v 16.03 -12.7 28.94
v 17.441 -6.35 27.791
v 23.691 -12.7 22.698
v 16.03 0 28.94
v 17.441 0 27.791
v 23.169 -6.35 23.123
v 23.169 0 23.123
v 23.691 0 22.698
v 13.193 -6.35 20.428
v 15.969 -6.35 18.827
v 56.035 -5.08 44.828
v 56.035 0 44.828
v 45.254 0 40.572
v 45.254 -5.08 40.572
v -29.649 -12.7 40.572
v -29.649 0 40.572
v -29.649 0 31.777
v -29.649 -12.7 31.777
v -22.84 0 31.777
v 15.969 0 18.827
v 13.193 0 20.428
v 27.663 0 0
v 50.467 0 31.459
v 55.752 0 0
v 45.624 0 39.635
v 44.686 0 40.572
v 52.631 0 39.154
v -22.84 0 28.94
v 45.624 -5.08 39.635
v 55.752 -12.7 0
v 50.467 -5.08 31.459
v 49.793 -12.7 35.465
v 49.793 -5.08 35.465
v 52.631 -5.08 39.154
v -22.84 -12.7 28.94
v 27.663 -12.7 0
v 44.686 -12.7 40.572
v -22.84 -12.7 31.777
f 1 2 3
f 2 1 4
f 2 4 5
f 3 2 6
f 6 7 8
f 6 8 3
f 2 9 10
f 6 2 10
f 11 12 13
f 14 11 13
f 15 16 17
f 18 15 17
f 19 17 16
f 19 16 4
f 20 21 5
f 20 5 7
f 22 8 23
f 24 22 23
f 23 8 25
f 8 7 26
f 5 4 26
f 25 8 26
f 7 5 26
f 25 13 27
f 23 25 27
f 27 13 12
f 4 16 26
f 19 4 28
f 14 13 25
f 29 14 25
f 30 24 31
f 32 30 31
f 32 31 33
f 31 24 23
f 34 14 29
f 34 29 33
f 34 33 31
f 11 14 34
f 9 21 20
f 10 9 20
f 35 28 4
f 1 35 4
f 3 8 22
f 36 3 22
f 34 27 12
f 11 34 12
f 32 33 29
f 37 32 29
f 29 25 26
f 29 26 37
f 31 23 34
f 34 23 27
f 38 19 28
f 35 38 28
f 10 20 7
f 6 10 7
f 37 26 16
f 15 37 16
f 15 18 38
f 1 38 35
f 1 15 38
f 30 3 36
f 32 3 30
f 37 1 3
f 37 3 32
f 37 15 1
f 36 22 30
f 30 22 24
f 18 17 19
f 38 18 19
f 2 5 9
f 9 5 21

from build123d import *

# Parameters (mm, degrees)
F1_DEPTH = 12.7
F3_DEPTH = 5.08
F5_DEPTH = 6.35


with BuildPart() as f1:
    # F0 (on Front) → F1 (new body)
    with BuildSketch(Plane.XZ):
        Polygon((23.690905, 22.697873), (27.663032, 0), (55.751652, 0), (49.793456, 35.465427), (44.68644, 40.572446), (-29.649096, 40.572446), (-29.649096, 31.777021), (-22.839734, 31.777021), (-22.839734, 28.939787), (16.030373, 28.939787), align=None)
    extrude(amount=F1_DEPTH)

    # F2 (on Front) → F3 (join)
    with BuildSketch(Plane.XZ):
        Polygon((56.03537, 44.828296), (45.253884, 40.572446), (47.605801, 34.614256), (50.077181, 30.074682), (52.630689, 39.153829), align=None)
    extrude(amount=F3_DEPTH)

    # F4 (on Front) → F5 (join)
    with BuildSketch(Plane.XZ):
        Polygon((23.407178, 23.265319), (17.44899, 27.804894), (13.193138, 20.428086), (15.968651, 18.826828), align=None)
    extrude(amount=F5_DEPTH)


solid = f1.part
